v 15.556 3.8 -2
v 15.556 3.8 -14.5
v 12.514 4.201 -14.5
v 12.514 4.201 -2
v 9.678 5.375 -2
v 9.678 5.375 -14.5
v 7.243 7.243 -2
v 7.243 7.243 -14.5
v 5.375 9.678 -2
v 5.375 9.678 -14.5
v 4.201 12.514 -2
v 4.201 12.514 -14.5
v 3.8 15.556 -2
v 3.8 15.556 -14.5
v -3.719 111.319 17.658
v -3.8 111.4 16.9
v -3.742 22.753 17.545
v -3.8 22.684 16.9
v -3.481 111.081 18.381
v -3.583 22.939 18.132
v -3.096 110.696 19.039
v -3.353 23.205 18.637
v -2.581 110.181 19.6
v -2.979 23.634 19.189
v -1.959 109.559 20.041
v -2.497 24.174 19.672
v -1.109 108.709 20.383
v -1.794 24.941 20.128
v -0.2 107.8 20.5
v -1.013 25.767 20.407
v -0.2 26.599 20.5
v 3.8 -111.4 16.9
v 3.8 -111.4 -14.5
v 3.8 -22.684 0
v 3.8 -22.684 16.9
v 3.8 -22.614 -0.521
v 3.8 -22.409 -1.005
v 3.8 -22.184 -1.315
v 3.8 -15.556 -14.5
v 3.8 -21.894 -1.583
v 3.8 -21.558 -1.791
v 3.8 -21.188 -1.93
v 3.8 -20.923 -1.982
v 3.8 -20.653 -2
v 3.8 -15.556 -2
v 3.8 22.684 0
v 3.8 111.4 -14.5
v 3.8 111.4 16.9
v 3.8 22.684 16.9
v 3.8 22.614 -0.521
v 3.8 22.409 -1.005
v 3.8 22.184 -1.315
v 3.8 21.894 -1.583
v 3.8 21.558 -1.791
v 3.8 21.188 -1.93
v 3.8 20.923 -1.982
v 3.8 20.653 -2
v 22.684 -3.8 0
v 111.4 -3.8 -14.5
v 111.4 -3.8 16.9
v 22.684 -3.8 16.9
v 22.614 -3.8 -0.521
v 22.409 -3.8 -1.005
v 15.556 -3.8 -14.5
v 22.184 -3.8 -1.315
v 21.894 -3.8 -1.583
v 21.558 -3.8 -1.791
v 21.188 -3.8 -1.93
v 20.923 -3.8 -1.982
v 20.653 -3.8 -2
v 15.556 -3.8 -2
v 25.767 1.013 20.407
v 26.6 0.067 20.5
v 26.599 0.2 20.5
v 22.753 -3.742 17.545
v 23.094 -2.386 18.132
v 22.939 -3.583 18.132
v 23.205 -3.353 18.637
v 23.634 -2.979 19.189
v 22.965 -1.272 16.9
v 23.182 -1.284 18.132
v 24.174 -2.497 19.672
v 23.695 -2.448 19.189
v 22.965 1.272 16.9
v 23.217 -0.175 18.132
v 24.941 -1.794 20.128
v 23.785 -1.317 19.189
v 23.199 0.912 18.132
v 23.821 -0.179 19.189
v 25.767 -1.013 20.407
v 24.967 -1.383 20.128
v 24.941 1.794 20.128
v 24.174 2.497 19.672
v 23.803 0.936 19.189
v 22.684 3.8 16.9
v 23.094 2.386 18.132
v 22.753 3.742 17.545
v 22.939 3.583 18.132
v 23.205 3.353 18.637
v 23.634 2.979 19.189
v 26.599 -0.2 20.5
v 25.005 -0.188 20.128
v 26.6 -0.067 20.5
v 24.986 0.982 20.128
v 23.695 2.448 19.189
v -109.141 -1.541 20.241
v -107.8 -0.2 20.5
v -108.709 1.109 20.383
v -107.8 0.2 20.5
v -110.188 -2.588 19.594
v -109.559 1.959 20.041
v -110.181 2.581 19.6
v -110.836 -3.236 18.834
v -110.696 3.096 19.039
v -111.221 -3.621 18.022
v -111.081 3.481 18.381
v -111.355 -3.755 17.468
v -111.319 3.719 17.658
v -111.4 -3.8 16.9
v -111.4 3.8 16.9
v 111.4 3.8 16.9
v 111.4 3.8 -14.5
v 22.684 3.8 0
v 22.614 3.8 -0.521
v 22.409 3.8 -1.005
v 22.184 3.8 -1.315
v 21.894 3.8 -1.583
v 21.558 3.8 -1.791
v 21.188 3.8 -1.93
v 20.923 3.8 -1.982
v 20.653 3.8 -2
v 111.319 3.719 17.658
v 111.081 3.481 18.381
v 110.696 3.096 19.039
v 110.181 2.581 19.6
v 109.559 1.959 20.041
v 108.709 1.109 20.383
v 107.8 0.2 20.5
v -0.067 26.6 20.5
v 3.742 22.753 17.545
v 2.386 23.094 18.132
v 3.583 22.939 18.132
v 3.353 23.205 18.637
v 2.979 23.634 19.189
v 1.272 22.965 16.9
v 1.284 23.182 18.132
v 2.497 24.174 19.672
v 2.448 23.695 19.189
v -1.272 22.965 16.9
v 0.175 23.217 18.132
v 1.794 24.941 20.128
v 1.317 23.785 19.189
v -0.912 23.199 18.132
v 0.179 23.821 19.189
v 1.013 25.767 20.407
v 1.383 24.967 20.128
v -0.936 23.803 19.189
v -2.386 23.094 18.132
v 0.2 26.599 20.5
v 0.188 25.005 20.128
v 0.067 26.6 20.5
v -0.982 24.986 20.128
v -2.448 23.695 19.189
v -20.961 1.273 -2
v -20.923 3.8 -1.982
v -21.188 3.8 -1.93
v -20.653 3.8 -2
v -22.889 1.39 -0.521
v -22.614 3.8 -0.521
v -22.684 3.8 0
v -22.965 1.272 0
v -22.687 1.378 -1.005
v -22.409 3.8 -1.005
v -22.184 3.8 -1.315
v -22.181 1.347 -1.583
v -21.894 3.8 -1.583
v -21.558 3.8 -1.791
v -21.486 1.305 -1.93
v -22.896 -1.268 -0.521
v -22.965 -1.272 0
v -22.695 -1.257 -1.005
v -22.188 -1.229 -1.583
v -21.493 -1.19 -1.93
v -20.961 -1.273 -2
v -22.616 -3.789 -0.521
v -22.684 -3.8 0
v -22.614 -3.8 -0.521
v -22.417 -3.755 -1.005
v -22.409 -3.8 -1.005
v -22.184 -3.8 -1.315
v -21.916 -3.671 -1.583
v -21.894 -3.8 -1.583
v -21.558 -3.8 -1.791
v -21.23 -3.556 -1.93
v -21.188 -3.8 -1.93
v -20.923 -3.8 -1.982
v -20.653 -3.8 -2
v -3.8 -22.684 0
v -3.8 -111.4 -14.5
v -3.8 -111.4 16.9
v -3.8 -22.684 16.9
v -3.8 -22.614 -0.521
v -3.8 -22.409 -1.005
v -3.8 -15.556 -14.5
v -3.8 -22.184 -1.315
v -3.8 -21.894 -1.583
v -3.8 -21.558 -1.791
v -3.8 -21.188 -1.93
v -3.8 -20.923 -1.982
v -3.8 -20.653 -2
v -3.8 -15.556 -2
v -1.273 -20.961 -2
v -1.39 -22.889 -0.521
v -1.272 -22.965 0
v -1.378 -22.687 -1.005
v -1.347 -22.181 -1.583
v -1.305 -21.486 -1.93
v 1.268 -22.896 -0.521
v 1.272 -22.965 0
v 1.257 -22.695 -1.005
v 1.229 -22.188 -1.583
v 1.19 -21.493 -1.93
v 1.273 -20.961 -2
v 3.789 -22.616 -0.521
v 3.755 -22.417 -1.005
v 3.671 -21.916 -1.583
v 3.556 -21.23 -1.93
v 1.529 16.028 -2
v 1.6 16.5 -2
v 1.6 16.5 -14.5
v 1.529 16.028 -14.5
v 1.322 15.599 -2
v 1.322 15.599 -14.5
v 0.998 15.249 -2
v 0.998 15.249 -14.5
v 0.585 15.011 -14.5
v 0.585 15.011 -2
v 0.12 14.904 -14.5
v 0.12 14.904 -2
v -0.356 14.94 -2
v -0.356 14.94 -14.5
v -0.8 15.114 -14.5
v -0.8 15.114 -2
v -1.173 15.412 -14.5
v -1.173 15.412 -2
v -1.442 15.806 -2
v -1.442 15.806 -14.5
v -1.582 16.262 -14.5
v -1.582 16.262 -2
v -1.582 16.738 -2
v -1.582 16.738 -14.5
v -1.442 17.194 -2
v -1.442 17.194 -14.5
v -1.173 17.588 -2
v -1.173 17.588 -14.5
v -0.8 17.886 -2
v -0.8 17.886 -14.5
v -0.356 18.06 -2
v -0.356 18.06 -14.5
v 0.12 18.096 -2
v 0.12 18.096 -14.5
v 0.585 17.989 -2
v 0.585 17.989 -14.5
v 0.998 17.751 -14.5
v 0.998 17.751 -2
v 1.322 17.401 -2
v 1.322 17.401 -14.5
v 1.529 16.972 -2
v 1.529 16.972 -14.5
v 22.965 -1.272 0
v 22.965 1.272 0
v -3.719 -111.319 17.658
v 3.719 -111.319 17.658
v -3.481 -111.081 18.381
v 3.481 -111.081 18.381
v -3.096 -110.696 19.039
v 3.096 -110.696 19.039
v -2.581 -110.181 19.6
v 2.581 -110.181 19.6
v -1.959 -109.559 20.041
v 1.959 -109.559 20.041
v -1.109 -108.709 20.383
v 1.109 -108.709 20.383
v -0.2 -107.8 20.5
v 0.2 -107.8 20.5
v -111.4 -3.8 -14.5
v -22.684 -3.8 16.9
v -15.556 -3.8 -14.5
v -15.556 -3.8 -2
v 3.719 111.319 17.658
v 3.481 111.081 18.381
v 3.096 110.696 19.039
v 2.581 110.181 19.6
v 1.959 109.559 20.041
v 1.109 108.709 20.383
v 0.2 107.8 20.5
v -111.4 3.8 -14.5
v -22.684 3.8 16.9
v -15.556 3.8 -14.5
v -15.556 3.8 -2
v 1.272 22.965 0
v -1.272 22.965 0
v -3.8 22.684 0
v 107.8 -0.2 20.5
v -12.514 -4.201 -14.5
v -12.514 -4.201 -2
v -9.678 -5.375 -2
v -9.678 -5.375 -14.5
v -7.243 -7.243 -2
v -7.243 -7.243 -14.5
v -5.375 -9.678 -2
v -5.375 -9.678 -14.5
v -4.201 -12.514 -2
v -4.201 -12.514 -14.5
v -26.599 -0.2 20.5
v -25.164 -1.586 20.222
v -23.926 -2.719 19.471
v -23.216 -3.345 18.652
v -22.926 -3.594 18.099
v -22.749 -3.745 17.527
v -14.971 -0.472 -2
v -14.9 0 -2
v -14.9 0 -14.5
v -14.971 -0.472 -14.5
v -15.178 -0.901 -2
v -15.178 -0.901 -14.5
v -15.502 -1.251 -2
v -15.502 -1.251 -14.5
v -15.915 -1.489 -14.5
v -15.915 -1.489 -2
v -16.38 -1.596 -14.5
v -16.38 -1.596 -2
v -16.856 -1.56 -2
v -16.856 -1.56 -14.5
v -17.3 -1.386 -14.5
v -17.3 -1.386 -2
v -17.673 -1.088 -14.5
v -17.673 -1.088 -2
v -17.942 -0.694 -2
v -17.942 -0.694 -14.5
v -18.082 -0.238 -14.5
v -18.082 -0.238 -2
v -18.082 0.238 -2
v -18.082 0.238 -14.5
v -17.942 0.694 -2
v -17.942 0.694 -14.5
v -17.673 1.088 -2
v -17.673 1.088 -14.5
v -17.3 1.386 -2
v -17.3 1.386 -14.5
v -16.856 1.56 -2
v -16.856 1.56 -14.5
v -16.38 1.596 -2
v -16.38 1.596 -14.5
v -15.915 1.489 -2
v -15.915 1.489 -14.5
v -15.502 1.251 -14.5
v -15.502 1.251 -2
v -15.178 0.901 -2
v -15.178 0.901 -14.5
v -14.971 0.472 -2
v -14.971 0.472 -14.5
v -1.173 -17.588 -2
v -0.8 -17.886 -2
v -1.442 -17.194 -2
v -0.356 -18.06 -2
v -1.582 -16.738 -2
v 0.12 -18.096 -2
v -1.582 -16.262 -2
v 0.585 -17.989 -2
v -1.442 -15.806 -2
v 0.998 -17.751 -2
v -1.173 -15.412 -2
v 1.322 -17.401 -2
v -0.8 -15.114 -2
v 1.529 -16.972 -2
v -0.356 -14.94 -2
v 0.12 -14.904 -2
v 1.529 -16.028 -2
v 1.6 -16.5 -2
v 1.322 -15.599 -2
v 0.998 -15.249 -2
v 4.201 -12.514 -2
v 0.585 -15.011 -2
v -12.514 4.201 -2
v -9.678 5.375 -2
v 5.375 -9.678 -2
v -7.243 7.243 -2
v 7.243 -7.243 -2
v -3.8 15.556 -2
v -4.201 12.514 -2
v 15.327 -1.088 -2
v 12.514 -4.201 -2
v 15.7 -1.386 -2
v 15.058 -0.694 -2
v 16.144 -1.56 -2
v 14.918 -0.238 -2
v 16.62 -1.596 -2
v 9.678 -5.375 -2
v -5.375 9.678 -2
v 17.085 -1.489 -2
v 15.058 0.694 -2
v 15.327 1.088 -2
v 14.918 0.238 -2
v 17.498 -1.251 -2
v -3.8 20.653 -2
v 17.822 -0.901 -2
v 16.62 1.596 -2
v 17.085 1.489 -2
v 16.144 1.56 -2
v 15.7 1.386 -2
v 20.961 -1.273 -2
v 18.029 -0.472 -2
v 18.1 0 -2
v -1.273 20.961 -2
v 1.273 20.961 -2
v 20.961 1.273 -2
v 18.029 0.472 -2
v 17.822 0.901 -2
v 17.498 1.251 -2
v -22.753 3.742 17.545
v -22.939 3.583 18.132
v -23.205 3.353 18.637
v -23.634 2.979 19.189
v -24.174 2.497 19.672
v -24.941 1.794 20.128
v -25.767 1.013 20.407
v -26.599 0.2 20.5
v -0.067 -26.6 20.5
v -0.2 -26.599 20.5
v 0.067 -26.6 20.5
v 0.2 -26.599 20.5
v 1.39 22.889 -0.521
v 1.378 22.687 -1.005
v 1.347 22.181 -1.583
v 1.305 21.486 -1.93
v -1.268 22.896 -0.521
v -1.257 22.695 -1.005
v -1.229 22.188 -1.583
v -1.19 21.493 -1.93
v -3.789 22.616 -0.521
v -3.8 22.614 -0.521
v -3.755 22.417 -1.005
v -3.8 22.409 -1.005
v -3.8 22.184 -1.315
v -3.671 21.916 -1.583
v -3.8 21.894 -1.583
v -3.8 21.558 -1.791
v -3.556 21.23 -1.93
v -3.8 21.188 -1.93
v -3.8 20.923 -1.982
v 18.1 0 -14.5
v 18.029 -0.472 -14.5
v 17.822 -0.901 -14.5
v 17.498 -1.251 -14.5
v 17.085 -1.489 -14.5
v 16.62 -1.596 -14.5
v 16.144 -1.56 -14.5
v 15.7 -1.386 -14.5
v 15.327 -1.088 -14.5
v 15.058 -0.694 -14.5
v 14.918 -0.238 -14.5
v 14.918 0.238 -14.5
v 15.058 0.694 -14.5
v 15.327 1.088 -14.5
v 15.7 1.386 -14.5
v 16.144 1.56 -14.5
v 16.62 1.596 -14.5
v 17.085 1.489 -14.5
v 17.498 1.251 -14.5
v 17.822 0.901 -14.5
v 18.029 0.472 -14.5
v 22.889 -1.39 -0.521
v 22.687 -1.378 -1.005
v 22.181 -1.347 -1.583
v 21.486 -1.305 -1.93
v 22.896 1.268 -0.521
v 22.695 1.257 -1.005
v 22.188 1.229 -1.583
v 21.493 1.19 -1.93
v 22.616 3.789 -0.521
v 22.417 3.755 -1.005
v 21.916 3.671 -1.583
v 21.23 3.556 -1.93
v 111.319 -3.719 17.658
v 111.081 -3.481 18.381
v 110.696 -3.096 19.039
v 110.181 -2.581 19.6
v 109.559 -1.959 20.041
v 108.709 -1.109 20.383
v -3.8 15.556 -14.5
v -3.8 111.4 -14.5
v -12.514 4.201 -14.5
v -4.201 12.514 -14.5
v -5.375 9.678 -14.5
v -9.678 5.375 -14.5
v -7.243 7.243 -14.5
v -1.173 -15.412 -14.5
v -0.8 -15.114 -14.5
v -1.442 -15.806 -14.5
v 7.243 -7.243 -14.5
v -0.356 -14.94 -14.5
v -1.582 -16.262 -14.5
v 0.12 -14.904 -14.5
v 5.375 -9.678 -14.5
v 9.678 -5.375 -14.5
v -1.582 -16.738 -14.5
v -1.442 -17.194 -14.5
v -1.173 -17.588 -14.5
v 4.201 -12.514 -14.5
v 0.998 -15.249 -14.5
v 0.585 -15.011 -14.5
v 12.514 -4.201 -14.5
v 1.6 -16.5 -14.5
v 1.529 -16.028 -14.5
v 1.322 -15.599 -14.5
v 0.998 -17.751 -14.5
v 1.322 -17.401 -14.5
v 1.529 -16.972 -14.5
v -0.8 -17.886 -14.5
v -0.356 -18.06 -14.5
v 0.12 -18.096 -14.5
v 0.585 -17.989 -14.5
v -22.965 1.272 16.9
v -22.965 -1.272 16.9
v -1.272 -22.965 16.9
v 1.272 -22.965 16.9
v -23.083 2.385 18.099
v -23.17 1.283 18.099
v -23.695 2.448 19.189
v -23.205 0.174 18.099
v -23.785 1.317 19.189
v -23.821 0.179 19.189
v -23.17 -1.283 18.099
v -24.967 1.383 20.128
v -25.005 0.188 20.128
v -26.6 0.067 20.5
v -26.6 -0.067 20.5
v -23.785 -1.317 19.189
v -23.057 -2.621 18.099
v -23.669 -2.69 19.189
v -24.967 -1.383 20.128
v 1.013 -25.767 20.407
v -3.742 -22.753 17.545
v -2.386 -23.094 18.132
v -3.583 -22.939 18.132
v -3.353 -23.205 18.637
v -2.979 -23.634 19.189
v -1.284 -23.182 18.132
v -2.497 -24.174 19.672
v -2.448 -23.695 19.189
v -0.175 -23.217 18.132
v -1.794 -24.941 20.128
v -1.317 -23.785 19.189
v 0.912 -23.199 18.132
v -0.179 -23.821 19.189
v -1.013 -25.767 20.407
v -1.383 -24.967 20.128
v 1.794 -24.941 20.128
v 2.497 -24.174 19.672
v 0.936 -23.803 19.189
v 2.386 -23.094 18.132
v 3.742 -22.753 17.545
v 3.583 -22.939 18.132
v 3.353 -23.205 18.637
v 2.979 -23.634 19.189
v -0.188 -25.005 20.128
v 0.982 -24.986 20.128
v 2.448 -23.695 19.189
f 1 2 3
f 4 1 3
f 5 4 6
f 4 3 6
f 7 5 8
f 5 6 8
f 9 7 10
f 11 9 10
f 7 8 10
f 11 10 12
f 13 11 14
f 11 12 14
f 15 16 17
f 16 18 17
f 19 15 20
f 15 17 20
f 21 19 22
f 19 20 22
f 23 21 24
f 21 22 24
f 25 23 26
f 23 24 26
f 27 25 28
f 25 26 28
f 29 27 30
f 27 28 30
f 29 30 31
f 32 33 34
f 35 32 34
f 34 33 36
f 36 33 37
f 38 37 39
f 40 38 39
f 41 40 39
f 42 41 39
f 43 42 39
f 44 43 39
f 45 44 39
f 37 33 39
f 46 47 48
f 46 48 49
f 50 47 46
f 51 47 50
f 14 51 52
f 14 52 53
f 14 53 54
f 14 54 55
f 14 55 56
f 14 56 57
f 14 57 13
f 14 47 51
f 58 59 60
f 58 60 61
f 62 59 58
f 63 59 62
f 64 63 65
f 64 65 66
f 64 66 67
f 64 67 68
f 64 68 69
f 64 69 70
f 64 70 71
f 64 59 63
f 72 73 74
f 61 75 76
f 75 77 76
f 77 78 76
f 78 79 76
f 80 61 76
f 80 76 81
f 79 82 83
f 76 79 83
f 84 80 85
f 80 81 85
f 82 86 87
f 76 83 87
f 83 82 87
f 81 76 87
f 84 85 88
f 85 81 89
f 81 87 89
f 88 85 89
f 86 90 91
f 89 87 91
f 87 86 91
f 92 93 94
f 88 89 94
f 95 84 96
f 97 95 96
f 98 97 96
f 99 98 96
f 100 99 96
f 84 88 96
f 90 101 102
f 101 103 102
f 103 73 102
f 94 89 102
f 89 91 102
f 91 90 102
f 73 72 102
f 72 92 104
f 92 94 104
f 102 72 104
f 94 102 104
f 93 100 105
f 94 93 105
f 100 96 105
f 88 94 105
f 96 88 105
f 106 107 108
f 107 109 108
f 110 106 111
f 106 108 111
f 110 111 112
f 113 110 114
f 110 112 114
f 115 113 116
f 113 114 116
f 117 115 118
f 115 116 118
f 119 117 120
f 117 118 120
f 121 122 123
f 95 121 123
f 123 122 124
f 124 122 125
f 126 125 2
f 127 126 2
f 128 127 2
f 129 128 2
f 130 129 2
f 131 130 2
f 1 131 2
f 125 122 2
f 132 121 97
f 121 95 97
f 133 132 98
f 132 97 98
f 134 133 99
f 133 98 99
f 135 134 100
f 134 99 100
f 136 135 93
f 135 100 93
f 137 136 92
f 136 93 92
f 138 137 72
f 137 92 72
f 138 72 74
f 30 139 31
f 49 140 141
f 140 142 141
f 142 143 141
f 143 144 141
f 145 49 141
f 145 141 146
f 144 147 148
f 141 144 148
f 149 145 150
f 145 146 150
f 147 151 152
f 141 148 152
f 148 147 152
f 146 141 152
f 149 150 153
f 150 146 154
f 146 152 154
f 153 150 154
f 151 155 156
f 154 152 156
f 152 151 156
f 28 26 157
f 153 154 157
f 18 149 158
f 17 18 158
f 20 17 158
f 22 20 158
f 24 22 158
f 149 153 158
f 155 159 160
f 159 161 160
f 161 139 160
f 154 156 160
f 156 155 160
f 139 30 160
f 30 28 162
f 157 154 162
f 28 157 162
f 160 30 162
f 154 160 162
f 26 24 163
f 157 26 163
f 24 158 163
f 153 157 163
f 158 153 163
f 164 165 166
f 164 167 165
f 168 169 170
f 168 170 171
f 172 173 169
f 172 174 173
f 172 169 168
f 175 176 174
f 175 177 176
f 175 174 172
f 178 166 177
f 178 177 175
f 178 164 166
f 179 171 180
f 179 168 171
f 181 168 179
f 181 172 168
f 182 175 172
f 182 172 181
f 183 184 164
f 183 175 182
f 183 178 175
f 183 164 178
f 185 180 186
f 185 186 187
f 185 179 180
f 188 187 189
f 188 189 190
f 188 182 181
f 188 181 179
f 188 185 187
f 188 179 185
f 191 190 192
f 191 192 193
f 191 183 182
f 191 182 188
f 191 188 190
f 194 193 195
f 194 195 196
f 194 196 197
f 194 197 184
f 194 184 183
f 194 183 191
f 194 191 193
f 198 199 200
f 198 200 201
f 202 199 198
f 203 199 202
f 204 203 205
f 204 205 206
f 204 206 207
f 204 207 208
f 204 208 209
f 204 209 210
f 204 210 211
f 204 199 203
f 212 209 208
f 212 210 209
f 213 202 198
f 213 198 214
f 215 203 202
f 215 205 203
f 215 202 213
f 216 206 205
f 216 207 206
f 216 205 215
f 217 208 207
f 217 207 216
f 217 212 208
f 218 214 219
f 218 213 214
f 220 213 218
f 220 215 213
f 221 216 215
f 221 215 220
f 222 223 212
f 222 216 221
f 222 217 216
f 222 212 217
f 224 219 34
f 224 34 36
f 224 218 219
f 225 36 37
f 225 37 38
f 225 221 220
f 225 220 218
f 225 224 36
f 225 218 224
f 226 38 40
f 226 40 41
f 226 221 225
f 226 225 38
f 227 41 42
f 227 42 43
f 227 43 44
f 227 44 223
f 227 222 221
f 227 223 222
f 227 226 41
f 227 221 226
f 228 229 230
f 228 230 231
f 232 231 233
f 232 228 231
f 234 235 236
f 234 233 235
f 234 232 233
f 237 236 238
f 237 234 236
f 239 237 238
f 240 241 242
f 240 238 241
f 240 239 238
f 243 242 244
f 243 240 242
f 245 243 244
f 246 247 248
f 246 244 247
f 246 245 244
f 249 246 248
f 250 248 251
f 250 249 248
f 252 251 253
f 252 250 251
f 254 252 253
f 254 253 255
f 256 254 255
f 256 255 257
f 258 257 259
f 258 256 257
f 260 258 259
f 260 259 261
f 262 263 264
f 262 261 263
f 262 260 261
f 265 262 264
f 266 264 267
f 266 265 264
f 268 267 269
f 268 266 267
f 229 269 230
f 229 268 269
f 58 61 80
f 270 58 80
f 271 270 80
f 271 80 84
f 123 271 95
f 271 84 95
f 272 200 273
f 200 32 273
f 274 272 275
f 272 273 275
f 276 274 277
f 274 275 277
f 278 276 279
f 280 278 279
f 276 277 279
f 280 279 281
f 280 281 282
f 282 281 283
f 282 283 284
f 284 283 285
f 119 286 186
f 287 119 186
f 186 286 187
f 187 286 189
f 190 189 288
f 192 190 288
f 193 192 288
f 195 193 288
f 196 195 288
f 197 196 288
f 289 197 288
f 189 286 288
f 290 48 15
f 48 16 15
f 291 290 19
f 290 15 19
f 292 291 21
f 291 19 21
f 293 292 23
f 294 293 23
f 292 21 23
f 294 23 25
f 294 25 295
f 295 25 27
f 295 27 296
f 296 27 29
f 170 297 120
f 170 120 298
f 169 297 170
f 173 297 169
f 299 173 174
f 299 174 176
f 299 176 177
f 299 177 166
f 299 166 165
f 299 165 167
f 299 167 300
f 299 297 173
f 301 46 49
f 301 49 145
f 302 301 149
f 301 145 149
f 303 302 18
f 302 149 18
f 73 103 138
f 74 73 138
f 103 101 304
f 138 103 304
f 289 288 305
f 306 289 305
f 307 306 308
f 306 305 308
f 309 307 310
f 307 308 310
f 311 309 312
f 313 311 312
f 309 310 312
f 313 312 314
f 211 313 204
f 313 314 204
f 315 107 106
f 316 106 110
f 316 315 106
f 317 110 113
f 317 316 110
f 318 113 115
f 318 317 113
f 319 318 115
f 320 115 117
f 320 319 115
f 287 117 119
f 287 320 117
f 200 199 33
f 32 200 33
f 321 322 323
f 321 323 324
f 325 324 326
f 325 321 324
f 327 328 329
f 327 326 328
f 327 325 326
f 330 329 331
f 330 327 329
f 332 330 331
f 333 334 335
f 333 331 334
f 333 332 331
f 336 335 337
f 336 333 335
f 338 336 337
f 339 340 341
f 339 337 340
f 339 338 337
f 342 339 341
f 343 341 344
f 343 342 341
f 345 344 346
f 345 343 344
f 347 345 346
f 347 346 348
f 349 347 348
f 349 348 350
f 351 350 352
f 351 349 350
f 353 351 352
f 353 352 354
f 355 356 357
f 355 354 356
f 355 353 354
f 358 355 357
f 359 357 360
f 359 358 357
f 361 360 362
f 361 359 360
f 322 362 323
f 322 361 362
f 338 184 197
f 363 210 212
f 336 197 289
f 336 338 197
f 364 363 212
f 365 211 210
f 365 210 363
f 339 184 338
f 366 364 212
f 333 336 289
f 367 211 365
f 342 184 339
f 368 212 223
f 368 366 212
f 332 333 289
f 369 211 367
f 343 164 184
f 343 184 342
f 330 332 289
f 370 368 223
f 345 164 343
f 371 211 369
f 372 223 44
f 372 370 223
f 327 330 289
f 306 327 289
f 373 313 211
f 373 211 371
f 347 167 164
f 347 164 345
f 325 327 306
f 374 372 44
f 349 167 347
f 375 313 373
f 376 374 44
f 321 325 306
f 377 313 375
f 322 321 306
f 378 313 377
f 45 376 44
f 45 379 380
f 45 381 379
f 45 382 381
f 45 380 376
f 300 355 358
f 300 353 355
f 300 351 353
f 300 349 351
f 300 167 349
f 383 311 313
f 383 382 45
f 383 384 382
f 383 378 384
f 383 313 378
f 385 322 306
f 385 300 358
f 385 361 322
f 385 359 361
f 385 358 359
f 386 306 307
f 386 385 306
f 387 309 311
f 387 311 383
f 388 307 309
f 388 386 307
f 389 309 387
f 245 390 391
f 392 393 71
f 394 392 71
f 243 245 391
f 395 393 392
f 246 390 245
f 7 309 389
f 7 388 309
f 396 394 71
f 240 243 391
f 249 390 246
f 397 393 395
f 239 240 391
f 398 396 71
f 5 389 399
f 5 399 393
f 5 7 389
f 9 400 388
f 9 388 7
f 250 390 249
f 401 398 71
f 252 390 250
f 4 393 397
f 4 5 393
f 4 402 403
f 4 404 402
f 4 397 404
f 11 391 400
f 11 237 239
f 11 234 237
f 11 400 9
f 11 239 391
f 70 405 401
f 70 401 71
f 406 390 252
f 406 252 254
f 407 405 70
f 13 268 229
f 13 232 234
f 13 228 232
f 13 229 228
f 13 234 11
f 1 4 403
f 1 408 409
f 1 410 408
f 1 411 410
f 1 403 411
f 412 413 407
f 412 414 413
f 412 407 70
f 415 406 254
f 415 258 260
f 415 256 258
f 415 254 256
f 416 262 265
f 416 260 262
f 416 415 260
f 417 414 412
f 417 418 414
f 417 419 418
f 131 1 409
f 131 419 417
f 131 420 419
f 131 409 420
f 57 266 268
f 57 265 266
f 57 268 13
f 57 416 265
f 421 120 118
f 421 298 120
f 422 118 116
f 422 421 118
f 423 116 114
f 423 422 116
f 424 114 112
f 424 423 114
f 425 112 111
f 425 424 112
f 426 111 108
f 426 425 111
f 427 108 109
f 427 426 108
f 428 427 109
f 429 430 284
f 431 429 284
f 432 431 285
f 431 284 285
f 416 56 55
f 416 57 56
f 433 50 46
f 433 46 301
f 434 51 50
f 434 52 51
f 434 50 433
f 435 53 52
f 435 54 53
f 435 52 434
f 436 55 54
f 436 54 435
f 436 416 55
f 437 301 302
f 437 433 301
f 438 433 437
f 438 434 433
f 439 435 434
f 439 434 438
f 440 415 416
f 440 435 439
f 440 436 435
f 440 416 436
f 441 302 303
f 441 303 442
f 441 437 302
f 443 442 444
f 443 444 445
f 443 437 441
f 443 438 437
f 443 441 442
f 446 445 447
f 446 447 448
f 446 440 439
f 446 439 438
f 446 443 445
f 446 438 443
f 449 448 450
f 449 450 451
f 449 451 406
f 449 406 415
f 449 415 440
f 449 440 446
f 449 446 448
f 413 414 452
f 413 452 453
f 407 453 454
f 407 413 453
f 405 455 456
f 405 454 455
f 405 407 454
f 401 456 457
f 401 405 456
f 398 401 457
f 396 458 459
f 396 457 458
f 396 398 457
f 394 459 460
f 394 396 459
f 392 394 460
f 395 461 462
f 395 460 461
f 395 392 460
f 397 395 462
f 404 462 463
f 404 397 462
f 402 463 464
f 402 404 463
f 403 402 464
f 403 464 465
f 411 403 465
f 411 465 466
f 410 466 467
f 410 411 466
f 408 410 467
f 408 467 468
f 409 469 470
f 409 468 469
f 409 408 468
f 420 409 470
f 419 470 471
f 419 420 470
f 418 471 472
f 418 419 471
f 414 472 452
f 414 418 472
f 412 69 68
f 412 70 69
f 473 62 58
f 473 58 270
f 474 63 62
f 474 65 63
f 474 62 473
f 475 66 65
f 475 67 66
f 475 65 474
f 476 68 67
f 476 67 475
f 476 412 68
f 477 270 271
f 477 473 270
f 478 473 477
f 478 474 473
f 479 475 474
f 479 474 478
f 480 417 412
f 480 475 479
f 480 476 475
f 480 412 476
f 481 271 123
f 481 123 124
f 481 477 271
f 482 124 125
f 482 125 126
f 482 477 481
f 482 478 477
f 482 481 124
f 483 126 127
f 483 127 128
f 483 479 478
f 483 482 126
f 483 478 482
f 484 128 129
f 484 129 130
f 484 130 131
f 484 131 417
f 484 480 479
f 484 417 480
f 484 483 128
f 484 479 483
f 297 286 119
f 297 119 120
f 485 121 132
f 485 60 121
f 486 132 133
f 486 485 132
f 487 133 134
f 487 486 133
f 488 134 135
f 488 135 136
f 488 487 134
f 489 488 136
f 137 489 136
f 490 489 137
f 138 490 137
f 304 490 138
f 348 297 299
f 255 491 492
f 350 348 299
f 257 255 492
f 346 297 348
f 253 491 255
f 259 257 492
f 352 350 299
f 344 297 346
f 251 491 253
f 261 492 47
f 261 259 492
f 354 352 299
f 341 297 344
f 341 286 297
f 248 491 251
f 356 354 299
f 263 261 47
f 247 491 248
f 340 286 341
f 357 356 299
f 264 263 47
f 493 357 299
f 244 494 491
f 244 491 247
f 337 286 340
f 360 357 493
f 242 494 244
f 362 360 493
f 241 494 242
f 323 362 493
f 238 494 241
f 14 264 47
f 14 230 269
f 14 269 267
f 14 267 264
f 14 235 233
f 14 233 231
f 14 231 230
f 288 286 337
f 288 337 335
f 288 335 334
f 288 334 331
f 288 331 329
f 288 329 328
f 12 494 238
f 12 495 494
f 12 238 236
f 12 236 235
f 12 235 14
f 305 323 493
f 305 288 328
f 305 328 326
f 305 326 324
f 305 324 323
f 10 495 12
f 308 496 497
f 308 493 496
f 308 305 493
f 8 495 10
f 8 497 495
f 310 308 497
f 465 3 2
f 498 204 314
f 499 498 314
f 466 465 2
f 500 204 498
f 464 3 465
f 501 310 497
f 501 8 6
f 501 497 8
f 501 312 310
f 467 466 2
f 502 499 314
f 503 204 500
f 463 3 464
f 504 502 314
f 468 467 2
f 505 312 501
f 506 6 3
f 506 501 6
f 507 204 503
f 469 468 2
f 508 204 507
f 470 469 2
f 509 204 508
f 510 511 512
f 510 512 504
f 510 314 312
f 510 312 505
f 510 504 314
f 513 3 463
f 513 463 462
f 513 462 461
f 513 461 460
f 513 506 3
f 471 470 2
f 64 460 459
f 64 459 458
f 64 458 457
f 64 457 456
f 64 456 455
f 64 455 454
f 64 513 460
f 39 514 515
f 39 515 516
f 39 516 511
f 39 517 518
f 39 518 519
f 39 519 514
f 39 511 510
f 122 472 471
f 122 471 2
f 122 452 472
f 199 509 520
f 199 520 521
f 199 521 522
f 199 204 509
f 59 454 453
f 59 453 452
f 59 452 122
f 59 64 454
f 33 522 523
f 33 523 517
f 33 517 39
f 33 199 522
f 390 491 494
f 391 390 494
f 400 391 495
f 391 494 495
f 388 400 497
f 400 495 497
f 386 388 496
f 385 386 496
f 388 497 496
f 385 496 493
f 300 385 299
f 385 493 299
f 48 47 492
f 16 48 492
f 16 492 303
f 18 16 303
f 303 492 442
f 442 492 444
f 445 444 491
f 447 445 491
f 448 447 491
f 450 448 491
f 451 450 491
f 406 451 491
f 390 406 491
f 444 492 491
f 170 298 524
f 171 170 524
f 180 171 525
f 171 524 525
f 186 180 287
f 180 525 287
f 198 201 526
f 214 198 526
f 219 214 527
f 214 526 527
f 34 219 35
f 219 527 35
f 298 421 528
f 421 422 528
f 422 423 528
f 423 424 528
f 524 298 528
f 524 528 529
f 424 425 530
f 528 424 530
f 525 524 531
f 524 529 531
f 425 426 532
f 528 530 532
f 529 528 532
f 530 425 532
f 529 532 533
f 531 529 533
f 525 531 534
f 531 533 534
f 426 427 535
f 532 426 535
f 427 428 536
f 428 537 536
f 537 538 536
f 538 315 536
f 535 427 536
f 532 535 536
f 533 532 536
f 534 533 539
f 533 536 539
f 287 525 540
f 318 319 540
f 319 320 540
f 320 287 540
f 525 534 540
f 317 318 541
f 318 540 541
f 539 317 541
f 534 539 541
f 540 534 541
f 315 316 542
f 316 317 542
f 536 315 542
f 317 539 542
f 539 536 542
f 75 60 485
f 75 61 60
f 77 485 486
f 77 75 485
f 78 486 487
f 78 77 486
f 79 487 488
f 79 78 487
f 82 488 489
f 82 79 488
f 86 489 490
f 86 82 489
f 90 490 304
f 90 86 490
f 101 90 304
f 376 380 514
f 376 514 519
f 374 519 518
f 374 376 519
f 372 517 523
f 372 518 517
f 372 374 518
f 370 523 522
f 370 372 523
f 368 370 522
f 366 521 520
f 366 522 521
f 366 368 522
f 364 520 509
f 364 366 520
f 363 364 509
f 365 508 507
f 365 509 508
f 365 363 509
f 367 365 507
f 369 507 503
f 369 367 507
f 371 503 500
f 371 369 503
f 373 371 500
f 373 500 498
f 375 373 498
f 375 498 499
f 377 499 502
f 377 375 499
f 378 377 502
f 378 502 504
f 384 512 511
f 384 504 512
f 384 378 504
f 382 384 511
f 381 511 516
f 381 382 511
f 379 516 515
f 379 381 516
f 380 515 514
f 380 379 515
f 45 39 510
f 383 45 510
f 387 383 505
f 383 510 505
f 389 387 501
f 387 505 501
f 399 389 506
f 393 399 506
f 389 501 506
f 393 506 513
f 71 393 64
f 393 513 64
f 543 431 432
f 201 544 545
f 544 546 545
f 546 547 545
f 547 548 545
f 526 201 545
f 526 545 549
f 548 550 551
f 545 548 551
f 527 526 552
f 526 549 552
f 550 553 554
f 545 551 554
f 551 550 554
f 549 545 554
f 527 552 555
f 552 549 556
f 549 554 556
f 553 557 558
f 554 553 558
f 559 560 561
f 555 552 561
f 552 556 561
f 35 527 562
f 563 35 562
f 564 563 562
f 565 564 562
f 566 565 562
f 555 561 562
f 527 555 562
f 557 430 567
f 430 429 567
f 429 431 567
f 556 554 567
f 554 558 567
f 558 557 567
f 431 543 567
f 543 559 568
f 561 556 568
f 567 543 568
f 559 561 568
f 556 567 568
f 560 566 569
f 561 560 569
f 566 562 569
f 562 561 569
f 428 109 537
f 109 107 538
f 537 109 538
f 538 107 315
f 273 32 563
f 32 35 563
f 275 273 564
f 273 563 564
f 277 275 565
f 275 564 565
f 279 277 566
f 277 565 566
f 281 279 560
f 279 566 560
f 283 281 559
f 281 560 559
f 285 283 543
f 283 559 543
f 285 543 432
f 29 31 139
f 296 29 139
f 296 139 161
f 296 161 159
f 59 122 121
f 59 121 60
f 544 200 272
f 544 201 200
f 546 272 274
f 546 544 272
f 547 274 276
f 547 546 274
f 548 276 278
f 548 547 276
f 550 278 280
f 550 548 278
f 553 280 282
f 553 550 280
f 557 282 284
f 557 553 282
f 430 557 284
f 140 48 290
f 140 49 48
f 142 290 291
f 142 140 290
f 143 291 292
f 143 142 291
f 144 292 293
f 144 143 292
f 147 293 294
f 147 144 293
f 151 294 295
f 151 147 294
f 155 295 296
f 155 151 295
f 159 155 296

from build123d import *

# Parameters (mm, degrees)
SKETCH006_R     = 1.6
PAD003_DEPTH    = 22.5
SKETCH023_W     = 224
SKETCH023_H     = 224
POCKET006_DEPTH = 10
SKETCH025_R     = 23
POCKET007_DEPTH = 22.5
FILLET_R        = 2
FILLET010_R     = 3.6


with BuildPart() as part:
    # Sketch006 (on Face23 of Pad) → Pad003 (new body, symmetric)
    with BuildSketch(Plane(origin=(0, 0, -2), x_dir=(1, 0, 0), z_dir=(0, 0, -1))):
        with BuildLine():
            Line((-111.4, -3.8), (-15.556349, -3.8))
            ThreePointArc((-3.8, -15.556349), (-7.243355, -7.243355), (-15.556349, -3.8))
            Line((-3.8, -111.4), (-3.8, -15.556349))
            Line((3.8, -111.4), (-3.8, -111.4))
            Line((3.8, -111.4), (3.8, -15.556349))
            ThreePointArc((15.556349, -3.8), (7.243355, -7.243355), (3.8, -15.556349))
            Line((111.4, -3.8), (15.556349, -3.8))
            Line((111.4, -3.8), (111.4, 3.8))
            Line((111.4, 3.8), (15.556349, 3.8))
            ThreePointArc((3.8, 15.556349), (7.243355, 7.243355), (15.556349, 3.8))
            Line((3.8, 111.4), (3.8, 15.556349))
            Line((-3.8, 111.4), (3.8, 111.4))
            Line((-3.8, 111.4), (-3.8, 15.556349))
            ThreePointArc((-15.556349, 3.8), (-7.243355, 7.243355), (-3.8, 15.556349))
            Line((-111.4, 3.8), (-15.556349, 3.8))
            Line((-111.4, 3.8), (-111.4, -3.8))
        make_face()
        with Locations((-16.5, 0)):
            Circle(SKETCH006_R, mode=Mode.SUBTRACT)
        with Locations((0, -16.5)):
            Circle(SKETCH006_R, mode=Mode.SUBTRACT)
        with Locations((16.5, 0)):
            Circle(SKETCH006_R, mode=Mode.SUBTRACT)
        with Locations((0, 16.5)):
            Circle(SKETCH006_R, mode=Mode.SUBTRACT)
    extrude(amount=PAD003_DEPTH, both=True)

    # Sketch023 → Pocket006 (cut)
    with BuildSketch(Plane(origin=(0, 0, -24.5), x_dir=(1, 0, 0), z_dir=(0, 0, -1))):
        Rectangle(SKETCH023_W, SKETCH023_H)
    extrude(amount=-POCKET006_DEPTH, mode=Mode.SUBTRACT)

    # Sketch025 → Pocket007 (cut)
    with BuildSketch(Plane.XY.offset(20.5)):
        Circle(SKETCH025_R)
    extrude(amount=-POCKET007_DEPTH, mode=Mode.SUBTRACT)

    # Fillet
    fillet_edges = [part.edges().sort_by_distance(p)[0] for p in [
        (0, -23, -2),
        (0, 23, -2),
        (22.920843, 1.906562, -2),
        (-23, 0, -2),
    ]]
    fillet(fillet_edges, radius=FILLET_R)

    # Fillet010
    fillet010_edges = [part.edges().sort_by_distance(p)[0] for p in [
        (0, 23, 20.5),
        (3.8, 67.041958, 20.5),
        (0, 111.4, 20.5),
        (-3.8, 67.041958, 20.5),
        (67.041958, -3.8, 20.5),
        (111.4, 0, 20.5),
        (67.041958, 3.8, 20.5),
        (22.920843, 1.906562, 20.5),
        (22.920843, -1.906562, 20.5),
        (-3.8, -67.041958, 20.5),
        (0, -111.4, 20.5),
        (3.8, -67.041958, 20.5),
        (0, -23, 20.5),
        (-67.041958, -3.8, 20.5),
        (-23, 0, 20.5),
        (-67.041958, 3.8, 20.5),
        (-111.4, 0, 20.5),
    ]]
    fillet(fillet010_edges, radius=FILLET010_R)


solid = part.part
